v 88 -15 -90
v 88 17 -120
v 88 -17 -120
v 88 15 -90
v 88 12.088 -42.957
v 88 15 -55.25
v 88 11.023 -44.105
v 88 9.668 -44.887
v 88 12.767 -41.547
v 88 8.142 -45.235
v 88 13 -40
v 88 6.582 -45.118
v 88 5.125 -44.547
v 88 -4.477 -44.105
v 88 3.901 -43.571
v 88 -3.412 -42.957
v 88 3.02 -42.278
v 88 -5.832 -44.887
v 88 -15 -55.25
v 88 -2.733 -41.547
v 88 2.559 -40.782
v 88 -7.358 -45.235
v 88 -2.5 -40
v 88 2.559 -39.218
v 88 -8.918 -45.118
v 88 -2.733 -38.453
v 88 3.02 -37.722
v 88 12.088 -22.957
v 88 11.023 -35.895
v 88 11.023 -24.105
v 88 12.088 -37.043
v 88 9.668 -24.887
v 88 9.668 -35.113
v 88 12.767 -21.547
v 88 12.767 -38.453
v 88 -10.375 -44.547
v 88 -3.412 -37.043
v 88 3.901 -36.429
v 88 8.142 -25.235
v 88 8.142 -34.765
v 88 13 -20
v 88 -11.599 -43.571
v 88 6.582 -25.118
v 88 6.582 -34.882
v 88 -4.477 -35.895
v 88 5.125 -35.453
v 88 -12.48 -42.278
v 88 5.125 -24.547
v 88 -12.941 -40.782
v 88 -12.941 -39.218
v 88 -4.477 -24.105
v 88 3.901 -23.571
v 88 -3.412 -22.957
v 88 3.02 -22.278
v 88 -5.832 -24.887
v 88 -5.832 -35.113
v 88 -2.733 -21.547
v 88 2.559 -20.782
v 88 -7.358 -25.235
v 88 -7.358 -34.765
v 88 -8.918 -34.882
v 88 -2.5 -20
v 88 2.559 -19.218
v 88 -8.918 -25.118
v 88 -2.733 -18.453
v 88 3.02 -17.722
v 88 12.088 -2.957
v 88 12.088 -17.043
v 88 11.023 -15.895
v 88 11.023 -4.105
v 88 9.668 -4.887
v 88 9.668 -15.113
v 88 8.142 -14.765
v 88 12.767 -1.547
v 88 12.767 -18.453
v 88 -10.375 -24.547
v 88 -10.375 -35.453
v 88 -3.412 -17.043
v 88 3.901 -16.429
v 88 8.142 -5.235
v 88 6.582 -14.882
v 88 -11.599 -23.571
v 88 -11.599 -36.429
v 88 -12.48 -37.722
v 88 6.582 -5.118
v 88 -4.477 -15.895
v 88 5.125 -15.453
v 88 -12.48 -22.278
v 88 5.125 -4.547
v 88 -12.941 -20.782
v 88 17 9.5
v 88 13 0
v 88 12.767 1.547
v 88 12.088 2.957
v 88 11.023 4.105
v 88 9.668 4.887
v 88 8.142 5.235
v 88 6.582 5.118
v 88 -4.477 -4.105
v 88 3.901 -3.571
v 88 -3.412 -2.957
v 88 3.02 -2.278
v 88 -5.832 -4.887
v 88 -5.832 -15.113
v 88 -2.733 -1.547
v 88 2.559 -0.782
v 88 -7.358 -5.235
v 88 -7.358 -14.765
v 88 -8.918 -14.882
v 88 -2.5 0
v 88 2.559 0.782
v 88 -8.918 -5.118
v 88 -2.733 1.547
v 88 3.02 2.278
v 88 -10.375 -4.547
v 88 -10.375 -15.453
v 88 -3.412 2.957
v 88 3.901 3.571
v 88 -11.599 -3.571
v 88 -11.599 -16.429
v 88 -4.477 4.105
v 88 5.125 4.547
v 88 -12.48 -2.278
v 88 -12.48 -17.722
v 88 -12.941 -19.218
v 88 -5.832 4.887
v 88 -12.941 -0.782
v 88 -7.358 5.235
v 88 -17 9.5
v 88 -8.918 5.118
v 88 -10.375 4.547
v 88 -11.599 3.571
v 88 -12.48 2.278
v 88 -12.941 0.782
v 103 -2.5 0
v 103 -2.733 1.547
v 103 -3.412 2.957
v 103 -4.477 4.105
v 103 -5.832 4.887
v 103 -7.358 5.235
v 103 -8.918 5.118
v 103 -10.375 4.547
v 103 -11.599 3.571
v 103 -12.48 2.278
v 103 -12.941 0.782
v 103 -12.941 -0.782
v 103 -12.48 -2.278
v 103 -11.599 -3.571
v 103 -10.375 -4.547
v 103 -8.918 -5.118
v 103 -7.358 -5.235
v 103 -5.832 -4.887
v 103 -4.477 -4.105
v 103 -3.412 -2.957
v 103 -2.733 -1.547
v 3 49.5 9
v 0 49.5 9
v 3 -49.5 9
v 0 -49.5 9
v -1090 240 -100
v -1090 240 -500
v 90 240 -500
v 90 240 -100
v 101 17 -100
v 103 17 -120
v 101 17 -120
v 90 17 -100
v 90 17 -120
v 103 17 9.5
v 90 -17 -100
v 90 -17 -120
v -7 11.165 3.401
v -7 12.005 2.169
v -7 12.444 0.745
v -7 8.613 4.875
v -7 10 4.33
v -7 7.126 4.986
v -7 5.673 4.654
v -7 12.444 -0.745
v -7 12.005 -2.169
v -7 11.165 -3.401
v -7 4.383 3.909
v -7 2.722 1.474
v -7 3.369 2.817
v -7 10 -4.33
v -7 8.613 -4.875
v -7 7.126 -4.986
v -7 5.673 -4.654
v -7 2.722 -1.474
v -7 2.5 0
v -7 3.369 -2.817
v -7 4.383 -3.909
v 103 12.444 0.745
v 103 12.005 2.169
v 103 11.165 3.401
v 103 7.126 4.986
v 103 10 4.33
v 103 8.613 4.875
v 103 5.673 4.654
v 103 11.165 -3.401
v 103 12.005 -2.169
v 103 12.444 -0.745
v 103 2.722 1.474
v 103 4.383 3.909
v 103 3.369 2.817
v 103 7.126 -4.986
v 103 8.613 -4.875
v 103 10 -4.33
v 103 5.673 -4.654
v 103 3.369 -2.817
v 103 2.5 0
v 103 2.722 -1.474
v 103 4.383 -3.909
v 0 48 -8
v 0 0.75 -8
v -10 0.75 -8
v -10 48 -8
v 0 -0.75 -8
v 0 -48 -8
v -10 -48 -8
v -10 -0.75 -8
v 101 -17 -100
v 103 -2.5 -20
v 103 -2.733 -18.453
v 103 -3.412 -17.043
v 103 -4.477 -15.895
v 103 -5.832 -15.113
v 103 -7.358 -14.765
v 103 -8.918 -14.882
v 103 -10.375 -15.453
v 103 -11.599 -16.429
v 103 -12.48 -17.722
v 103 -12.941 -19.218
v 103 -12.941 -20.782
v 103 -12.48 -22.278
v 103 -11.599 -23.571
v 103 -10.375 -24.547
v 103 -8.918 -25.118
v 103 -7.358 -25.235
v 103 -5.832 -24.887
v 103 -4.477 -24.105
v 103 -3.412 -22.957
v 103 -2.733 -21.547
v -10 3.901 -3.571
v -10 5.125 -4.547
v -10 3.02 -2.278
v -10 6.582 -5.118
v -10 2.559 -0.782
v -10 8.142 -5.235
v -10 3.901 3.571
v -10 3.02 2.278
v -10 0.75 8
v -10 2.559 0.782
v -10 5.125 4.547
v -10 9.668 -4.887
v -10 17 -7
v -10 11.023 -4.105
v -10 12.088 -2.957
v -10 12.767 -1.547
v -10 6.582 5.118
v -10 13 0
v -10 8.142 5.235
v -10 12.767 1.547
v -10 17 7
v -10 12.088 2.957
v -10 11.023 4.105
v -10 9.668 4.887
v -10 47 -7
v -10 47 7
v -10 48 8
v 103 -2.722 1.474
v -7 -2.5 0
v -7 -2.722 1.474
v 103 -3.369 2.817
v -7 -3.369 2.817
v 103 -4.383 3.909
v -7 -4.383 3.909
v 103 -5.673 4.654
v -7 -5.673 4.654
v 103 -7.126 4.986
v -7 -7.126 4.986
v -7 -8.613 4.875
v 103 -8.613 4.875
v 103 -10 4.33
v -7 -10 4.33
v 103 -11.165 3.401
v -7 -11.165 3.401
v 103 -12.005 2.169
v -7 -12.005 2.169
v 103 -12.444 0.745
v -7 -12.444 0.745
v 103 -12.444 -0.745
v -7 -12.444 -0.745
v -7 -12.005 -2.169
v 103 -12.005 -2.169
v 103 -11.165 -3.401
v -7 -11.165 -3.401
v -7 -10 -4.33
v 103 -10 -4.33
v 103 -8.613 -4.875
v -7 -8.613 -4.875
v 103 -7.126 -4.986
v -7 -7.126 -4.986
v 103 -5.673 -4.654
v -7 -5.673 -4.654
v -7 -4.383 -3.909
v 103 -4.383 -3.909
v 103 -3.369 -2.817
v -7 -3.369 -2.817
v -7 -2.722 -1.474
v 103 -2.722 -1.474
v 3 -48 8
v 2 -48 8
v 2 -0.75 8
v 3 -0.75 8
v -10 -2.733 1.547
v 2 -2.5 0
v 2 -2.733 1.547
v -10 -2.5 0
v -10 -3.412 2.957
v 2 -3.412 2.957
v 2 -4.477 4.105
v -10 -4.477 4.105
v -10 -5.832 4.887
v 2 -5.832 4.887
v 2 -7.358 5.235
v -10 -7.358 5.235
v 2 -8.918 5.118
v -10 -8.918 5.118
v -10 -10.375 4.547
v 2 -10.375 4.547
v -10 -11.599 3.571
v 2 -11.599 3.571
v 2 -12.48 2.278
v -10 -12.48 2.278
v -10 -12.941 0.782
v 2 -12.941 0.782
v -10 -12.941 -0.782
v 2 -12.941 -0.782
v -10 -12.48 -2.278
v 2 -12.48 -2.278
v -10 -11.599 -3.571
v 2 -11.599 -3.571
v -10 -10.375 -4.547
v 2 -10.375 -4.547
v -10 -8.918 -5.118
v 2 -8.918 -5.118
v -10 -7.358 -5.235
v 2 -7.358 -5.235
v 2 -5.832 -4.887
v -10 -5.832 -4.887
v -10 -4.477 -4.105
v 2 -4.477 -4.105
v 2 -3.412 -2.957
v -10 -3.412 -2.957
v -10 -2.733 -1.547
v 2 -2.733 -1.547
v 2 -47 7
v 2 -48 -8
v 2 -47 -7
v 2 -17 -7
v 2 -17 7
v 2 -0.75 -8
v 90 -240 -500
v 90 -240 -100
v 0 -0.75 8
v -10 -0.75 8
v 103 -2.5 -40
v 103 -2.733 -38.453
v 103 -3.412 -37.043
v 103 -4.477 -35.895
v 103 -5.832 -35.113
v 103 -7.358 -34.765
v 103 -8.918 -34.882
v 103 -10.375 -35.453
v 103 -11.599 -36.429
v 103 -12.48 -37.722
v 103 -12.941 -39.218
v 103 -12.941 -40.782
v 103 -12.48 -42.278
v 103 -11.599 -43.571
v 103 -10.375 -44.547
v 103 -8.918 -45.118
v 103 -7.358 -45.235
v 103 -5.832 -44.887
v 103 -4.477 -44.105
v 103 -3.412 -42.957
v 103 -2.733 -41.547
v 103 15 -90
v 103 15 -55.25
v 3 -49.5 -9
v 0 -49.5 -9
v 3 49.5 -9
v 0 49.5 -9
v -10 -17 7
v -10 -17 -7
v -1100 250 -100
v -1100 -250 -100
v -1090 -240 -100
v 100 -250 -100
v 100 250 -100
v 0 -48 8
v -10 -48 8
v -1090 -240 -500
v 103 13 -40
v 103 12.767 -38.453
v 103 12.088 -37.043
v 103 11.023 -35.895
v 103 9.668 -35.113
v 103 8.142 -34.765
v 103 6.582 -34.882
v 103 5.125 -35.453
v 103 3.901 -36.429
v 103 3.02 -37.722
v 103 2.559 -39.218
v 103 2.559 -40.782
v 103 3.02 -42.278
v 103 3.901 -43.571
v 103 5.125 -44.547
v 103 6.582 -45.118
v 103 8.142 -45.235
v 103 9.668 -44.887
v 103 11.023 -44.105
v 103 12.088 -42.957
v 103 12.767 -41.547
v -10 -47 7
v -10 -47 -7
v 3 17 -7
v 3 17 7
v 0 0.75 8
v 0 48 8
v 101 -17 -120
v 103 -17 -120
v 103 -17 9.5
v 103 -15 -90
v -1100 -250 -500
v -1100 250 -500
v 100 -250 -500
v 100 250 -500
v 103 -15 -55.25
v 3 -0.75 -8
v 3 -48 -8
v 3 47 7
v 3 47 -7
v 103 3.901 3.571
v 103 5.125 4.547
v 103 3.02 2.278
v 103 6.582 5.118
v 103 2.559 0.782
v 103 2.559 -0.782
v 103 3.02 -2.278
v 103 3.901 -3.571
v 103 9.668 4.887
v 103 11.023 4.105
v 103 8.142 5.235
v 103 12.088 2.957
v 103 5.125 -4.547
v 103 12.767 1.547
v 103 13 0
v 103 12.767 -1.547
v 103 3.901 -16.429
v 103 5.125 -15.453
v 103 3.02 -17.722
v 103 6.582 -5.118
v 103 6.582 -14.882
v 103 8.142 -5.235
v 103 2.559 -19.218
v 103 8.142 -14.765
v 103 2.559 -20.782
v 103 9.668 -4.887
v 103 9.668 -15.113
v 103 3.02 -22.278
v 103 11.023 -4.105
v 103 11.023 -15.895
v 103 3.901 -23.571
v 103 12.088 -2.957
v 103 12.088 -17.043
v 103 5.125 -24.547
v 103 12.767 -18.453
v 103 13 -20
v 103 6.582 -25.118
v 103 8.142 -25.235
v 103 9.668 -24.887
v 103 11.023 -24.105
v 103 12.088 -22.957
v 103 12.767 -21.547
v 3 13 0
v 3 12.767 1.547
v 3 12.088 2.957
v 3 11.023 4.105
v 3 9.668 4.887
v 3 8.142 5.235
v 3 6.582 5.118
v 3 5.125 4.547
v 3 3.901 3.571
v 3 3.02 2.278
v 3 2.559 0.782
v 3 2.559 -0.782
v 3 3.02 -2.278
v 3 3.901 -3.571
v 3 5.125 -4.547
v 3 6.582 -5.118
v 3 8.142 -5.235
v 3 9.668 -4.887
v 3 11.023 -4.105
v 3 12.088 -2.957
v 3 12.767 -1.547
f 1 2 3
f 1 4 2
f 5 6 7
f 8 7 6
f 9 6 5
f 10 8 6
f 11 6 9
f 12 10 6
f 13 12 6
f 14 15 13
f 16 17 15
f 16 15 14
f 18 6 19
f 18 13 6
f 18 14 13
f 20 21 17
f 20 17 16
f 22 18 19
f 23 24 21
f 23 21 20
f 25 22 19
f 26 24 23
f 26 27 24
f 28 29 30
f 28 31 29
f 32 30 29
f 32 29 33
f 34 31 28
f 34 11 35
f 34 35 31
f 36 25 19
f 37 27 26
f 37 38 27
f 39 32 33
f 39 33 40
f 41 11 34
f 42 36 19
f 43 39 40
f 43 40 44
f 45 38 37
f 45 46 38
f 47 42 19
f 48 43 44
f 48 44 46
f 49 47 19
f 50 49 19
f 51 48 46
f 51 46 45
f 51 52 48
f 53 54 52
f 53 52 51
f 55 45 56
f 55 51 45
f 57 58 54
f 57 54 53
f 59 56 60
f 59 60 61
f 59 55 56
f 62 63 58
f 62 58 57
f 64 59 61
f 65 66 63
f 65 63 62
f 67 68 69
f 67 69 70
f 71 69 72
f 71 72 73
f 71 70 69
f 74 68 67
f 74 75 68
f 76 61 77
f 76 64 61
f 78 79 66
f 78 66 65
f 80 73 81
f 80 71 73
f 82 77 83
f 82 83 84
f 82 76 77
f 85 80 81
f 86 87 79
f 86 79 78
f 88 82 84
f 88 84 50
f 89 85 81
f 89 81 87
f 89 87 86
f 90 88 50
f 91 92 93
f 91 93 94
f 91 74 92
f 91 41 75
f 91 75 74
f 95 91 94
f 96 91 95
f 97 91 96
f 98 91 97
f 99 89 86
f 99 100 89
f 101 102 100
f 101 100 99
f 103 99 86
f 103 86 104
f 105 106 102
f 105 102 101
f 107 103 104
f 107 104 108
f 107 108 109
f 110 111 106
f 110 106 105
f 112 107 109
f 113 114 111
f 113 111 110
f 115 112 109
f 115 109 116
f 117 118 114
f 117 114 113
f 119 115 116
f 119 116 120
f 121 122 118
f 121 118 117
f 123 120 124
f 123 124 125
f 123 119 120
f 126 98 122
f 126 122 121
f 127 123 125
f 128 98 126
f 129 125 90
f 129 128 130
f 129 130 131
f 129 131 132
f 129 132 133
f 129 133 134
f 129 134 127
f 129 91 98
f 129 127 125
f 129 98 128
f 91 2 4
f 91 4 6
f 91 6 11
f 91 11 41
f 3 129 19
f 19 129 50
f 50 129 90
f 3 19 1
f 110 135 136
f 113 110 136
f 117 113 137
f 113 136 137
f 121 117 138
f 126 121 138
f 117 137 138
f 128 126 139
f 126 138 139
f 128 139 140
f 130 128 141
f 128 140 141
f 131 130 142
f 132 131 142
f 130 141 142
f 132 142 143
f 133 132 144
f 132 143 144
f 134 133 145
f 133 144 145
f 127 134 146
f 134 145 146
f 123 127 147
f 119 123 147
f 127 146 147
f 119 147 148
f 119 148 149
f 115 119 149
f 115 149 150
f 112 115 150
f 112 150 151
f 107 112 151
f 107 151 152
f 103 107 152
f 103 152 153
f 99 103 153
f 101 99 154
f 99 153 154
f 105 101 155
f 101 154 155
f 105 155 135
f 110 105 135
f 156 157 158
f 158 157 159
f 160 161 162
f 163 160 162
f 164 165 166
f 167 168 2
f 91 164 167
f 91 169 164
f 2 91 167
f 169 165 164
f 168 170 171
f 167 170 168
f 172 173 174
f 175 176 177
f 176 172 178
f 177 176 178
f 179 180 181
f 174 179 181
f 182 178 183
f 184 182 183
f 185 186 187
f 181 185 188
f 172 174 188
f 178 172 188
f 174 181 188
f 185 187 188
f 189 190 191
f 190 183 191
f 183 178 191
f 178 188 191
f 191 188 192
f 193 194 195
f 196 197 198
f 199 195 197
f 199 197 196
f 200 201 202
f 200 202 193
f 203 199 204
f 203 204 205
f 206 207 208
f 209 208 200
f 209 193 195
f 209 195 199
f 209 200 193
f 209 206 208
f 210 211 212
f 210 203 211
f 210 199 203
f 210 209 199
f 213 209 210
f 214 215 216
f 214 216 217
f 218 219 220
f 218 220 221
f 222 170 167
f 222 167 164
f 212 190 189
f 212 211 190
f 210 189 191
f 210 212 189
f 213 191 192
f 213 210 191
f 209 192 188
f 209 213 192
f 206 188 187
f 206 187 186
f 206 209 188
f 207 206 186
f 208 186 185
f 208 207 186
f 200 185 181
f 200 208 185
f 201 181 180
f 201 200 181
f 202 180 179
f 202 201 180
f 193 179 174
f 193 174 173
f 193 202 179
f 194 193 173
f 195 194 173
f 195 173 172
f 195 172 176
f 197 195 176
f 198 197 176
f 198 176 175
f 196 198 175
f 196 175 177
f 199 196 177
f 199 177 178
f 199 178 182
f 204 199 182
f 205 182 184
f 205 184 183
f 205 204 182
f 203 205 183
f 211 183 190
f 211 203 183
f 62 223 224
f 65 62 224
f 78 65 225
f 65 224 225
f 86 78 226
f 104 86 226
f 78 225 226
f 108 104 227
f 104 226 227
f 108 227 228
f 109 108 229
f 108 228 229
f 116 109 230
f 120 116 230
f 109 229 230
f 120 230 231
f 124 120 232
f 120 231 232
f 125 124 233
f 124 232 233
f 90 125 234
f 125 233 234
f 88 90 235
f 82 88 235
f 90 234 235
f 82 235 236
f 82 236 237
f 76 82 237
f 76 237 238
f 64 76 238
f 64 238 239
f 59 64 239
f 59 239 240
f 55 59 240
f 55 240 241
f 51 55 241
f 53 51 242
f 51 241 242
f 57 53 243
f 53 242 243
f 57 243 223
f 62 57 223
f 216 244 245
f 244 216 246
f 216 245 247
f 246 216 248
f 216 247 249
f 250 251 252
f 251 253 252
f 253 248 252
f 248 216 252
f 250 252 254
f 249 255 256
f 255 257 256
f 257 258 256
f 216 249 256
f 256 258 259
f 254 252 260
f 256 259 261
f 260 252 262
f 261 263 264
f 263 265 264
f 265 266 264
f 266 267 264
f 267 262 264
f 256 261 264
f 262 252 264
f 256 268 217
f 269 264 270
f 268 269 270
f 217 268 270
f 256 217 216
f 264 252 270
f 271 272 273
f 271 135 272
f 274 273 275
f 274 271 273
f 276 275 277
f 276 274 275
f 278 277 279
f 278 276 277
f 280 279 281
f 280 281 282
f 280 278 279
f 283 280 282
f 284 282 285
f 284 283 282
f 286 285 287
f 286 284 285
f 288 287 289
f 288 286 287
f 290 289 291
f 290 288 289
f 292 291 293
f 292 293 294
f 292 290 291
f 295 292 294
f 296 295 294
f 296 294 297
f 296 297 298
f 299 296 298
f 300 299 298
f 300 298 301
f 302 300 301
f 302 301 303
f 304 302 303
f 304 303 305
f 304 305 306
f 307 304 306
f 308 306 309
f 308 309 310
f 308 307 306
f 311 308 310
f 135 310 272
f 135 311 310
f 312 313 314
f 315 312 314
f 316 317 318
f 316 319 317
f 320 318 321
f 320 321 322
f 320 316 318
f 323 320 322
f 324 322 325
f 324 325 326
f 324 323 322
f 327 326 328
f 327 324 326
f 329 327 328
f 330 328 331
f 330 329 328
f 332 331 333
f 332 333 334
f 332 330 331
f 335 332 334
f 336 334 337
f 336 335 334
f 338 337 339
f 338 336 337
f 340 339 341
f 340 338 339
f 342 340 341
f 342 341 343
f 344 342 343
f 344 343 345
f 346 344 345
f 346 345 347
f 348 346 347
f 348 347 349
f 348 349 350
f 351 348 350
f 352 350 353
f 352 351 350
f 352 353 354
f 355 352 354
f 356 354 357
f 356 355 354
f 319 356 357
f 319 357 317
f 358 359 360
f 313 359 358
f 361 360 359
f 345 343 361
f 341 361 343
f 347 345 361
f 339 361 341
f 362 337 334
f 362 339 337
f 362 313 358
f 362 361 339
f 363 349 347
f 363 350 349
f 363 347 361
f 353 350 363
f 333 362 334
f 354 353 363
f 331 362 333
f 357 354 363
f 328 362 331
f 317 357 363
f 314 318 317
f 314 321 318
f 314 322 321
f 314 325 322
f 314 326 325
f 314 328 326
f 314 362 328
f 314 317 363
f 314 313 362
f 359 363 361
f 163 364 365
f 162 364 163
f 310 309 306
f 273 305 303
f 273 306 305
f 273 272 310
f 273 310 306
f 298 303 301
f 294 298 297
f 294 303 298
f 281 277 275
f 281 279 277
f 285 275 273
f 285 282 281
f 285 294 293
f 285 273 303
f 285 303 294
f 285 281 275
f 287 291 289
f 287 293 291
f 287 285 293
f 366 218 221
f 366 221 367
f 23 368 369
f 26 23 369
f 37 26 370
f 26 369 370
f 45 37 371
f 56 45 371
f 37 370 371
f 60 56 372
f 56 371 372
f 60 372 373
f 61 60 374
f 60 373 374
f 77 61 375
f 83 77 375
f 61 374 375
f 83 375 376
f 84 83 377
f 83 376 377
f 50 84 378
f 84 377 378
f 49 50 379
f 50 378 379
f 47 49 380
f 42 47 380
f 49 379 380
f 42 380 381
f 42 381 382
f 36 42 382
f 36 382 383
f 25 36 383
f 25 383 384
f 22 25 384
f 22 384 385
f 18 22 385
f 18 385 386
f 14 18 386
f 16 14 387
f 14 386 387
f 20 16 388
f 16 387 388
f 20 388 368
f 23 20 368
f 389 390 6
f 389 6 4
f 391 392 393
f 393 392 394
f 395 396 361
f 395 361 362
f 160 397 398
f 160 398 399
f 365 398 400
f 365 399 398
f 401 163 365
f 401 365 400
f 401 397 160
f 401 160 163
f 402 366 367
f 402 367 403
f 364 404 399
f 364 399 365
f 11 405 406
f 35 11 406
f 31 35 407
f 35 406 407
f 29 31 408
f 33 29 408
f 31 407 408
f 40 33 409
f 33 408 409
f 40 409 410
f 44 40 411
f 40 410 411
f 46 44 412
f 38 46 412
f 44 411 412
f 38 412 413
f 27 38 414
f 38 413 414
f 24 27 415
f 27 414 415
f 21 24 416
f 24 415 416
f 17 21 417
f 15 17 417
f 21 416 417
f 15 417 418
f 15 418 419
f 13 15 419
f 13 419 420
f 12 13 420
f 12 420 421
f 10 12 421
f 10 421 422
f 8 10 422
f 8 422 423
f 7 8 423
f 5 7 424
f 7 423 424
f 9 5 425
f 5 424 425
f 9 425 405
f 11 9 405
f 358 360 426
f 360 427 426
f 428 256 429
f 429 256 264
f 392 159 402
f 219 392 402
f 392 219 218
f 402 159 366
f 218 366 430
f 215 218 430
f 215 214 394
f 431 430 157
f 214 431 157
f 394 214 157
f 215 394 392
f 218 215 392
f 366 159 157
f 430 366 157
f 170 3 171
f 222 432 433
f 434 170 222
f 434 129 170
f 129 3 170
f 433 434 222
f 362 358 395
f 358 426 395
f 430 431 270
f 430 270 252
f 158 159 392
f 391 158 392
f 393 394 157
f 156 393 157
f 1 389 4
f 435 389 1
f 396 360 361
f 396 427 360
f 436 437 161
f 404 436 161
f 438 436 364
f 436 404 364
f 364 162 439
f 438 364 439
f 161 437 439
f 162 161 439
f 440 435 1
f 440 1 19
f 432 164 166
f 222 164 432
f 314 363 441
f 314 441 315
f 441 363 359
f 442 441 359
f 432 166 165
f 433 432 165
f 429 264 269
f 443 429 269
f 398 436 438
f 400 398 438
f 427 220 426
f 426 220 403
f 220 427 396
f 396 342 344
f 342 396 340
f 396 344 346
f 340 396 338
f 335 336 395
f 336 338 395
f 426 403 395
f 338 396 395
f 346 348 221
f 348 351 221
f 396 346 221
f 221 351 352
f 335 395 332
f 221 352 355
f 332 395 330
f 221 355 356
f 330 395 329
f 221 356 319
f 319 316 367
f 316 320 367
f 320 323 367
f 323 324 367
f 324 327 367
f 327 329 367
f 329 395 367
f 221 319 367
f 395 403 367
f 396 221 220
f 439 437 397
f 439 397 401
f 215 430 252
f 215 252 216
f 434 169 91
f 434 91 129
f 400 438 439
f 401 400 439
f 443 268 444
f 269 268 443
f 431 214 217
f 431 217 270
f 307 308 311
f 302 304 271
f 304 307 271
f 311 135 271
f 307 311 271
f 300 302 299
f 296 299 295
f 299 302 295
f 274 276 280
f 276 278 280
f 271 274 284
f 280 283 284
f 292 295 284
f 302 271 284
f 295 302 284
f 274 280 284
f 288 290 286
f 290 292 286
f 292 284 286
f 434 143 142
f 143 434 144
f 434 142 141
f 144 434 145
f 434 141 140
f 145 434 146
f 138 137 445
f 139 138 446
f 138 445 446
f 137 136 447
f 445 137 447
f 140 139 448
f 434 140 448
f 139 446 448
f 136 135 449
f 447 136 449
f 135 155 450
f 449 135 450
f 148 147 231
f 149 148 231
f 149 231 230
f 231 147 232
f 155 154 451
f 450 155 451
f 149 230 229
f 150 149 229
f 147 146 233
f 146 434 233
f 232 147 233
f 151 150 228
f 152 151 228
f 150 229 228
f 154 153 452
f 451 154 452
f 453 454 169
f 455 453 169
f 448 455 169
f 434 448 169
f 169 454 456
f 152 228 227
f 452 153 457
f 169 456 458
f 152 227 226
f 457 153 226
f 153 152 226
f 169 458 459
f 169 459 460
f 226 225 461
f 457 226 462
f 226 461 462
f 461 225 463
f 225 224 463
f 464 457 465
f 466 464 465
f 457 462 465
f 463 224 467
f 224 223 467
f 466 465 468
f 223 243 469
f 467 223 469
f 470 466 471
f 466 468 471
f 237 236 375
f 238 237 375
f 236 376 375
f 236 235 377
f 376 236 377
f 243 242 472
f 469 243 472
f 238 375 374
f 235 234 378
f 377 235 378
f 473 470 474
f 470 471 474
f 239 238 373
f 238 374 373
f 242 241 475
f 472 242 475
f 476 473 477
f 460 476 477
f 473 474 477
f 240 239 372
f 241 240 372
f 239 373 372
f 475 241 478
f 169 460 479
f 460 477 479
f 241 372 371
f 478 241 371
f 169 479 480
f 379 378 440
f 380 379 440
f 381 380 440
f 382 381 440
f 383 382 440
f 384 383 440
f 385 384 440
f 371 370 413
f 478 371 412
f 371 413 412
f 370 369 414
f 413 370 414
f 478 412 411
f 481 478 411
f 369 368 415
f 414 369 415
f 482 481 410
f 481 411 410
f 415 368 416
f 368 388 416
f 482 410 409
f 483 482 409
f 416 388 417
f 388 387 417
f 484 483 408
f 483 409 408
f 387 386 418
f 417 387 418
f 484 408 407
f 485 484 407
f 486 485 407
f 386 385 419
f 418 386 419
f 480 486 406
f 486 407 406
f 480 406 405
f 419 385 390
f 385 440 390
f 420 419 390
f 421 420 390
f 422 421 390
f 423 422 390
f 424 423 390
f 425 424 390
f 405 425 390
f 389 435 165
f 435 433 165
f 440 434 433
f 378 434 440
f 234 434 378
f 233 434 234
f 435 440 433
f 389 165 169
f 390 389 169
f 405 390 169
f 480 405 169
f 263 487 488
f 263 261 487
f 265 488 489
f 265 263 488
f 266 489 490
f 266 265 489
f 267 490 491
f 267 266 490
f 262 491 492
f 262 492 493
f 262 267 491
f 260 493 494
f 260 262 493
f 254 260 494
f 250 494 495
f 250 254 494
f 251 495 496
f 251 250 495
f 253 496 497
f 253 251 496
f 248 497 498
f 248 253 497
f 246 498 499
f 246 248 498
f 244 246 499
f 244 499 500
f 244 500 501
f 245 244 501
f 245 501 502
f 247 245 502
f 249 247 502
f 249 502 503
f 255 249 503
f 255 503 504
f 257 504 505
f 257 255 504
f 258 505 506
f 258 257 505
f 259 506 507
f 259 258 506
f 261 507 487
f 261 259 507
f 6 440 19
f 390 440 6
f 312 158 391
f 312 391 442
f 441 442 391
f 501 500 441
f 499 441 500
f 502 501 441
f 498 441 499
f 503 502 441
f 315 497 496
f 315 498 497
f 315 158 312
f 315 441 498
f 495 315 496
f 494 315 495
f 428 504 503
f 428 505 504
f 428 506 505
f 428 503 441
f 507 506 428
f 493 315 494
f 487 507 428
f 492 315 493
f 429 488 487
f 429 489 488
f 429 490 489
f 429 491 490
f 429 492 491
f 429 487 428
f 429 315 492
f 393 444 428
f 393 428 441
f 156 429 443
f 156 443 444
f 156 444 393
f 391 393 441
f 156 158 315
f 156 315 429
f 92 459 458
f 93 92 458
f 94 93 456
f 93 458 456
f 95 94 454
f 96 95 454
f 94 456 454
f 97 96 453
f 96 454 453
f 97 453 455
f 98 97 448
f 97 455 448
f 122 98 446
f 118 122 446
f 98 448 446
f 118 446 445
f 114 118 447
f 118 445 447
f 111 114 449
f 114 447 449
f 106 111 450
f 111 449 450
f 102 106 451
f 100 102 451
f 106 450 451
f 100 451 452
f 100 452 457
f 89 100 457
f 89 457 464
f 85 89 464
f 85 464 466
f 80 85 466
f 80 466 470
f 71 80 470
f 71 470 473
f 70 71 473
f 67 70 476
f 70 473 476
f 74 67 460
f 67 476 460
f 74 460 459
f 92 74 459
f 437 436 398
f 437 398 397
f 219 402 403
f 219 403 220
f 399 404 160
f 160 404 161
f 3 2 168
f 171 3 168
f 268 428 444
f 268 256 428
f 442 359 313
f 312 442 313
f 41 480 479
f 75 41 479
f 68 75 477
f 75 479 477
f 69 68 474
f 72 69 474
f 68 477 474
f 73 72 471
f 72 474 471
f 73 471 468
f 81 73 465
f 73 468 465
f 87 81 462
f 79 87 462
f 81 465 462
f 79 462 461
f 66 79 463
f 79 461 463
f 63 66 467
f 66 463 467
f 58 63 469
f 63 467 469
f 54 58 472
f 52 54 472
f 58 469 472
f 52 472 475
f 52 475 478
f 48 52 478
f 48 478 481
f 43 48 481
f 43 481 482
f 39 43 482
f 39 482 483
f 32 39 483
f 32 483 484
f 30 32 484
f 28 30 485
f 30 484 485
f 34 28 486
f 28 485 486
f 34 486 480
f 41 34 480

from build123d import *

# Parameters (mm, degrees)
F0_W          = 1.5
F0_H          = 1
F0_H_2        = 16
F0_R          = 5.25
F0_W_2        = 30
F0_H_3        = 14
F1_DEPTH      = 3
F2_DEPTH      = 10
F2_DEPTH_BACK = 2
F5_W          = 1200
F5_H          = 500
F5_W_2        = 1180
F5_H_2        = 480
F6_DEPTH      = 400
F7_W          = 10
F7_H          = 2
F7_W_2        = 1
F7_H_2        = 30
F8_DEPTH      = 10
F9_DEPTH      = 20
F10_R         = 5.25
F11_DEPTH     = 15
F12_W         = 110
F12_H         = 5


# Not quite as in the source:
# - a feature names something its author has since deleted; it is built from what else it names
# - the program builds the solid bodies; features that only make, move or delete a surface that nothing else refers to are left out


with BuildPart() as f1:
    # F0 (on Right) → F1 (new body)
    with BuildSketch(Plane.YZ):
        Polygon((-0.75, 9), (-49.5, 9), (-49.5, -9), (-0.75, -9), (-0.75, -8), (-13, -8), (-16, -8), (-48, -8), (-48, 8), (-16, 8), (-13, 8), (-0.75, 8), align=None)
        with Locations((0, 8.5)):
            Rectangle(F0_W, F0_H)
        Polygon((49.5, 9), (0.75, 9), (0.75, 8), (13, 8), (16, 8), (48, 8), (48, -8), (16, -8), (13, -8), (0.75, -8), (0.75, -9), (49.5, -9), align=None)
        with Locations((0, -8.5)):
            Rectangle(F0_W, F0_H)
        Rectangle(F0_W, F0_H_2)
        Polygon((13, 8), (0.75, 8), (0.75, -8), (13, -8), (16, -8), (48, -8), (48, 8), (16, 8), align=None)
        with Locations((7.75, 0)):
            Circle(F0_R, mode=Mode.SUBTRACT)
        with Locations((32, 0)):
            Rectangle(F0_W_2, F0_H_3, mode=Mode.SUBTRACT)
    extrude(amount=F1_DEPTH)

    # F0 (on Right) → F2 (join, two sides)
    with BuildSketch(Plane.YZ) as f2_sk:
        Polygon((-0.75, -8), (-0.75, 8), (-13, 8), (-16, 8), (-48, 8), (-48, -8), (-16, -8), (-13, -8), align=None)
        with Locations((-32, 0)):
            Rectangle(F0_W_2, F0_H_3, mode=Mode.SUBTRACT)
        with Locations((-7.75, 0)):
            Circle(F0_R, mode=Mode.SUBTRACT)
        Polygon((13, 8), (0.75, 8), (0.75, -8), (13, -8), (16, -8), (48, -8), (48, 8), (16, 8), align=None)
        with Locations((7.75, 0)):
            Circle(F0_R, mode=Mode.SUBTRACT)
        with Locations((32, 0)):
            Rectangle(F0_W_2, F0_H_3, mode=Mode.SUBTRACT)
    extrude(amount=-F2_DEPTH)
    extrude(f2_sk.sketch, amount=F2_DEPTH_BACK)


with BuildPart() as f6:
    # F5 (on offset) → F6 (new body)
    with BuildSketch(Plane.XY.offset(-500)):
        with Locations((-500, 0)):
            Rectangle(F5_W, F5_H)
        with Locations((-500, 0)):
            Rectangle(F5_W_2, F5_H_2, mode=Mode.SUBTRACT)
    extrude(amount=F6_DEPTH)


with BuildPart() as f8:
    # F7 (on face) → F8 (new body)
    with BuildSketch(Plane.XY.offset(-100)):
        Polygon((101, 17), (101, 15), (101, -15), (101, -17), (103, -17), (103, 17), align=None)
        Polygon((90, -15), (90, 15), (90, 17), (88, 17), (88, -17), (90, -17), align=None)
        with Locations((95, 16)):
            Rectangle(F7_W, F7_H)
        with Locations((100.5, 16)):
            Rectangle(F7_W_2, F7_H)
        with Locations((100.5, -16)):
            Rectangle(F7_W_2, F7_H)
        with Locations((95, -16)):
            Rectangle(F7_W, F7_H)
        with Locations((100.5, 0)):
            Rectangle(F7_W_2, F7_H_2)
        with Locations((95, 0)):
            Rectangle(F7_W, F7_H_2)
    extrude(amount=F8_DEPTH)

    # F7 (on face) → F9 (join)
    with BuildSketch(Plane.XY.offset(-100)):
        Polygon((90, -15), (90, 15), (90, 17), (88, 17), (88, -17), (90, -17), align=None)
        Polygon((101, 17), (101, 15), (101, -15), (101, -17), (103, -17), (103, 17), align=None)
    extrude(amount=-F9_DEPTH)

    # F10 (on face) → F11 (join)
    with BuildSketch(Plane.YZ.offset(103)):
        Polygon((-15, -90), (-17, -90), (-17, -100), (17, -100), (17, -90), (15, -90), align=None)
        Polygon((-17, 9.5), (-17, -90), (-15, -90), (-15, -55.25), (15, -55.25), (15, -90), (17, -90), (17, 9.5), align=None)
        with Locations((-7.75, -40)):
            Circle(F10_R, mode=Mode.SUBTRACT)
        with Locations((-7.75, -20)):
            Circle(F10_R, mode=Mode.SUBTRACT)
        with Locations((-7.75, 0)):
            Circle(F10_R, mode=Mode.SUBTRACT)
        with Locations((7.75, -40)):
            Circle(F10_R, mode=Mode.SUBTRACT)
        with Locations((7.75, -20)):
            Circle(F10_R, mode=Mode.SUBTRACT)
        with Locations((7.75, 0)):
            Circle(F10_R, mode=Mode.SUBTRACT)
    extrude(amount=-F11_DEPTH)


with BuildPart() as f13:
    # F12 (on Top) → F13 (revolve)
    with BuildSketch(Plane.XY):
        with Locations((48, -5)):
            Rectangle(F12_W, F12_H)
    revolve(axis=Axis((48, -7.5, 0), (1, 0, 0)))


with BuildPart() as f14:
    # F12 (on Top) → F14 (revolve)
    with BuildSketch(Plane.XY):
        with Locations((48, 5)):
            Rectangle(F12_W, F12_H)
    revolve(axis=Axis((48, 7.5, 0), (1, 0, 0)))


solid = Compound([f1.part, f6.part, f8.part, f13.part, f14.part])
